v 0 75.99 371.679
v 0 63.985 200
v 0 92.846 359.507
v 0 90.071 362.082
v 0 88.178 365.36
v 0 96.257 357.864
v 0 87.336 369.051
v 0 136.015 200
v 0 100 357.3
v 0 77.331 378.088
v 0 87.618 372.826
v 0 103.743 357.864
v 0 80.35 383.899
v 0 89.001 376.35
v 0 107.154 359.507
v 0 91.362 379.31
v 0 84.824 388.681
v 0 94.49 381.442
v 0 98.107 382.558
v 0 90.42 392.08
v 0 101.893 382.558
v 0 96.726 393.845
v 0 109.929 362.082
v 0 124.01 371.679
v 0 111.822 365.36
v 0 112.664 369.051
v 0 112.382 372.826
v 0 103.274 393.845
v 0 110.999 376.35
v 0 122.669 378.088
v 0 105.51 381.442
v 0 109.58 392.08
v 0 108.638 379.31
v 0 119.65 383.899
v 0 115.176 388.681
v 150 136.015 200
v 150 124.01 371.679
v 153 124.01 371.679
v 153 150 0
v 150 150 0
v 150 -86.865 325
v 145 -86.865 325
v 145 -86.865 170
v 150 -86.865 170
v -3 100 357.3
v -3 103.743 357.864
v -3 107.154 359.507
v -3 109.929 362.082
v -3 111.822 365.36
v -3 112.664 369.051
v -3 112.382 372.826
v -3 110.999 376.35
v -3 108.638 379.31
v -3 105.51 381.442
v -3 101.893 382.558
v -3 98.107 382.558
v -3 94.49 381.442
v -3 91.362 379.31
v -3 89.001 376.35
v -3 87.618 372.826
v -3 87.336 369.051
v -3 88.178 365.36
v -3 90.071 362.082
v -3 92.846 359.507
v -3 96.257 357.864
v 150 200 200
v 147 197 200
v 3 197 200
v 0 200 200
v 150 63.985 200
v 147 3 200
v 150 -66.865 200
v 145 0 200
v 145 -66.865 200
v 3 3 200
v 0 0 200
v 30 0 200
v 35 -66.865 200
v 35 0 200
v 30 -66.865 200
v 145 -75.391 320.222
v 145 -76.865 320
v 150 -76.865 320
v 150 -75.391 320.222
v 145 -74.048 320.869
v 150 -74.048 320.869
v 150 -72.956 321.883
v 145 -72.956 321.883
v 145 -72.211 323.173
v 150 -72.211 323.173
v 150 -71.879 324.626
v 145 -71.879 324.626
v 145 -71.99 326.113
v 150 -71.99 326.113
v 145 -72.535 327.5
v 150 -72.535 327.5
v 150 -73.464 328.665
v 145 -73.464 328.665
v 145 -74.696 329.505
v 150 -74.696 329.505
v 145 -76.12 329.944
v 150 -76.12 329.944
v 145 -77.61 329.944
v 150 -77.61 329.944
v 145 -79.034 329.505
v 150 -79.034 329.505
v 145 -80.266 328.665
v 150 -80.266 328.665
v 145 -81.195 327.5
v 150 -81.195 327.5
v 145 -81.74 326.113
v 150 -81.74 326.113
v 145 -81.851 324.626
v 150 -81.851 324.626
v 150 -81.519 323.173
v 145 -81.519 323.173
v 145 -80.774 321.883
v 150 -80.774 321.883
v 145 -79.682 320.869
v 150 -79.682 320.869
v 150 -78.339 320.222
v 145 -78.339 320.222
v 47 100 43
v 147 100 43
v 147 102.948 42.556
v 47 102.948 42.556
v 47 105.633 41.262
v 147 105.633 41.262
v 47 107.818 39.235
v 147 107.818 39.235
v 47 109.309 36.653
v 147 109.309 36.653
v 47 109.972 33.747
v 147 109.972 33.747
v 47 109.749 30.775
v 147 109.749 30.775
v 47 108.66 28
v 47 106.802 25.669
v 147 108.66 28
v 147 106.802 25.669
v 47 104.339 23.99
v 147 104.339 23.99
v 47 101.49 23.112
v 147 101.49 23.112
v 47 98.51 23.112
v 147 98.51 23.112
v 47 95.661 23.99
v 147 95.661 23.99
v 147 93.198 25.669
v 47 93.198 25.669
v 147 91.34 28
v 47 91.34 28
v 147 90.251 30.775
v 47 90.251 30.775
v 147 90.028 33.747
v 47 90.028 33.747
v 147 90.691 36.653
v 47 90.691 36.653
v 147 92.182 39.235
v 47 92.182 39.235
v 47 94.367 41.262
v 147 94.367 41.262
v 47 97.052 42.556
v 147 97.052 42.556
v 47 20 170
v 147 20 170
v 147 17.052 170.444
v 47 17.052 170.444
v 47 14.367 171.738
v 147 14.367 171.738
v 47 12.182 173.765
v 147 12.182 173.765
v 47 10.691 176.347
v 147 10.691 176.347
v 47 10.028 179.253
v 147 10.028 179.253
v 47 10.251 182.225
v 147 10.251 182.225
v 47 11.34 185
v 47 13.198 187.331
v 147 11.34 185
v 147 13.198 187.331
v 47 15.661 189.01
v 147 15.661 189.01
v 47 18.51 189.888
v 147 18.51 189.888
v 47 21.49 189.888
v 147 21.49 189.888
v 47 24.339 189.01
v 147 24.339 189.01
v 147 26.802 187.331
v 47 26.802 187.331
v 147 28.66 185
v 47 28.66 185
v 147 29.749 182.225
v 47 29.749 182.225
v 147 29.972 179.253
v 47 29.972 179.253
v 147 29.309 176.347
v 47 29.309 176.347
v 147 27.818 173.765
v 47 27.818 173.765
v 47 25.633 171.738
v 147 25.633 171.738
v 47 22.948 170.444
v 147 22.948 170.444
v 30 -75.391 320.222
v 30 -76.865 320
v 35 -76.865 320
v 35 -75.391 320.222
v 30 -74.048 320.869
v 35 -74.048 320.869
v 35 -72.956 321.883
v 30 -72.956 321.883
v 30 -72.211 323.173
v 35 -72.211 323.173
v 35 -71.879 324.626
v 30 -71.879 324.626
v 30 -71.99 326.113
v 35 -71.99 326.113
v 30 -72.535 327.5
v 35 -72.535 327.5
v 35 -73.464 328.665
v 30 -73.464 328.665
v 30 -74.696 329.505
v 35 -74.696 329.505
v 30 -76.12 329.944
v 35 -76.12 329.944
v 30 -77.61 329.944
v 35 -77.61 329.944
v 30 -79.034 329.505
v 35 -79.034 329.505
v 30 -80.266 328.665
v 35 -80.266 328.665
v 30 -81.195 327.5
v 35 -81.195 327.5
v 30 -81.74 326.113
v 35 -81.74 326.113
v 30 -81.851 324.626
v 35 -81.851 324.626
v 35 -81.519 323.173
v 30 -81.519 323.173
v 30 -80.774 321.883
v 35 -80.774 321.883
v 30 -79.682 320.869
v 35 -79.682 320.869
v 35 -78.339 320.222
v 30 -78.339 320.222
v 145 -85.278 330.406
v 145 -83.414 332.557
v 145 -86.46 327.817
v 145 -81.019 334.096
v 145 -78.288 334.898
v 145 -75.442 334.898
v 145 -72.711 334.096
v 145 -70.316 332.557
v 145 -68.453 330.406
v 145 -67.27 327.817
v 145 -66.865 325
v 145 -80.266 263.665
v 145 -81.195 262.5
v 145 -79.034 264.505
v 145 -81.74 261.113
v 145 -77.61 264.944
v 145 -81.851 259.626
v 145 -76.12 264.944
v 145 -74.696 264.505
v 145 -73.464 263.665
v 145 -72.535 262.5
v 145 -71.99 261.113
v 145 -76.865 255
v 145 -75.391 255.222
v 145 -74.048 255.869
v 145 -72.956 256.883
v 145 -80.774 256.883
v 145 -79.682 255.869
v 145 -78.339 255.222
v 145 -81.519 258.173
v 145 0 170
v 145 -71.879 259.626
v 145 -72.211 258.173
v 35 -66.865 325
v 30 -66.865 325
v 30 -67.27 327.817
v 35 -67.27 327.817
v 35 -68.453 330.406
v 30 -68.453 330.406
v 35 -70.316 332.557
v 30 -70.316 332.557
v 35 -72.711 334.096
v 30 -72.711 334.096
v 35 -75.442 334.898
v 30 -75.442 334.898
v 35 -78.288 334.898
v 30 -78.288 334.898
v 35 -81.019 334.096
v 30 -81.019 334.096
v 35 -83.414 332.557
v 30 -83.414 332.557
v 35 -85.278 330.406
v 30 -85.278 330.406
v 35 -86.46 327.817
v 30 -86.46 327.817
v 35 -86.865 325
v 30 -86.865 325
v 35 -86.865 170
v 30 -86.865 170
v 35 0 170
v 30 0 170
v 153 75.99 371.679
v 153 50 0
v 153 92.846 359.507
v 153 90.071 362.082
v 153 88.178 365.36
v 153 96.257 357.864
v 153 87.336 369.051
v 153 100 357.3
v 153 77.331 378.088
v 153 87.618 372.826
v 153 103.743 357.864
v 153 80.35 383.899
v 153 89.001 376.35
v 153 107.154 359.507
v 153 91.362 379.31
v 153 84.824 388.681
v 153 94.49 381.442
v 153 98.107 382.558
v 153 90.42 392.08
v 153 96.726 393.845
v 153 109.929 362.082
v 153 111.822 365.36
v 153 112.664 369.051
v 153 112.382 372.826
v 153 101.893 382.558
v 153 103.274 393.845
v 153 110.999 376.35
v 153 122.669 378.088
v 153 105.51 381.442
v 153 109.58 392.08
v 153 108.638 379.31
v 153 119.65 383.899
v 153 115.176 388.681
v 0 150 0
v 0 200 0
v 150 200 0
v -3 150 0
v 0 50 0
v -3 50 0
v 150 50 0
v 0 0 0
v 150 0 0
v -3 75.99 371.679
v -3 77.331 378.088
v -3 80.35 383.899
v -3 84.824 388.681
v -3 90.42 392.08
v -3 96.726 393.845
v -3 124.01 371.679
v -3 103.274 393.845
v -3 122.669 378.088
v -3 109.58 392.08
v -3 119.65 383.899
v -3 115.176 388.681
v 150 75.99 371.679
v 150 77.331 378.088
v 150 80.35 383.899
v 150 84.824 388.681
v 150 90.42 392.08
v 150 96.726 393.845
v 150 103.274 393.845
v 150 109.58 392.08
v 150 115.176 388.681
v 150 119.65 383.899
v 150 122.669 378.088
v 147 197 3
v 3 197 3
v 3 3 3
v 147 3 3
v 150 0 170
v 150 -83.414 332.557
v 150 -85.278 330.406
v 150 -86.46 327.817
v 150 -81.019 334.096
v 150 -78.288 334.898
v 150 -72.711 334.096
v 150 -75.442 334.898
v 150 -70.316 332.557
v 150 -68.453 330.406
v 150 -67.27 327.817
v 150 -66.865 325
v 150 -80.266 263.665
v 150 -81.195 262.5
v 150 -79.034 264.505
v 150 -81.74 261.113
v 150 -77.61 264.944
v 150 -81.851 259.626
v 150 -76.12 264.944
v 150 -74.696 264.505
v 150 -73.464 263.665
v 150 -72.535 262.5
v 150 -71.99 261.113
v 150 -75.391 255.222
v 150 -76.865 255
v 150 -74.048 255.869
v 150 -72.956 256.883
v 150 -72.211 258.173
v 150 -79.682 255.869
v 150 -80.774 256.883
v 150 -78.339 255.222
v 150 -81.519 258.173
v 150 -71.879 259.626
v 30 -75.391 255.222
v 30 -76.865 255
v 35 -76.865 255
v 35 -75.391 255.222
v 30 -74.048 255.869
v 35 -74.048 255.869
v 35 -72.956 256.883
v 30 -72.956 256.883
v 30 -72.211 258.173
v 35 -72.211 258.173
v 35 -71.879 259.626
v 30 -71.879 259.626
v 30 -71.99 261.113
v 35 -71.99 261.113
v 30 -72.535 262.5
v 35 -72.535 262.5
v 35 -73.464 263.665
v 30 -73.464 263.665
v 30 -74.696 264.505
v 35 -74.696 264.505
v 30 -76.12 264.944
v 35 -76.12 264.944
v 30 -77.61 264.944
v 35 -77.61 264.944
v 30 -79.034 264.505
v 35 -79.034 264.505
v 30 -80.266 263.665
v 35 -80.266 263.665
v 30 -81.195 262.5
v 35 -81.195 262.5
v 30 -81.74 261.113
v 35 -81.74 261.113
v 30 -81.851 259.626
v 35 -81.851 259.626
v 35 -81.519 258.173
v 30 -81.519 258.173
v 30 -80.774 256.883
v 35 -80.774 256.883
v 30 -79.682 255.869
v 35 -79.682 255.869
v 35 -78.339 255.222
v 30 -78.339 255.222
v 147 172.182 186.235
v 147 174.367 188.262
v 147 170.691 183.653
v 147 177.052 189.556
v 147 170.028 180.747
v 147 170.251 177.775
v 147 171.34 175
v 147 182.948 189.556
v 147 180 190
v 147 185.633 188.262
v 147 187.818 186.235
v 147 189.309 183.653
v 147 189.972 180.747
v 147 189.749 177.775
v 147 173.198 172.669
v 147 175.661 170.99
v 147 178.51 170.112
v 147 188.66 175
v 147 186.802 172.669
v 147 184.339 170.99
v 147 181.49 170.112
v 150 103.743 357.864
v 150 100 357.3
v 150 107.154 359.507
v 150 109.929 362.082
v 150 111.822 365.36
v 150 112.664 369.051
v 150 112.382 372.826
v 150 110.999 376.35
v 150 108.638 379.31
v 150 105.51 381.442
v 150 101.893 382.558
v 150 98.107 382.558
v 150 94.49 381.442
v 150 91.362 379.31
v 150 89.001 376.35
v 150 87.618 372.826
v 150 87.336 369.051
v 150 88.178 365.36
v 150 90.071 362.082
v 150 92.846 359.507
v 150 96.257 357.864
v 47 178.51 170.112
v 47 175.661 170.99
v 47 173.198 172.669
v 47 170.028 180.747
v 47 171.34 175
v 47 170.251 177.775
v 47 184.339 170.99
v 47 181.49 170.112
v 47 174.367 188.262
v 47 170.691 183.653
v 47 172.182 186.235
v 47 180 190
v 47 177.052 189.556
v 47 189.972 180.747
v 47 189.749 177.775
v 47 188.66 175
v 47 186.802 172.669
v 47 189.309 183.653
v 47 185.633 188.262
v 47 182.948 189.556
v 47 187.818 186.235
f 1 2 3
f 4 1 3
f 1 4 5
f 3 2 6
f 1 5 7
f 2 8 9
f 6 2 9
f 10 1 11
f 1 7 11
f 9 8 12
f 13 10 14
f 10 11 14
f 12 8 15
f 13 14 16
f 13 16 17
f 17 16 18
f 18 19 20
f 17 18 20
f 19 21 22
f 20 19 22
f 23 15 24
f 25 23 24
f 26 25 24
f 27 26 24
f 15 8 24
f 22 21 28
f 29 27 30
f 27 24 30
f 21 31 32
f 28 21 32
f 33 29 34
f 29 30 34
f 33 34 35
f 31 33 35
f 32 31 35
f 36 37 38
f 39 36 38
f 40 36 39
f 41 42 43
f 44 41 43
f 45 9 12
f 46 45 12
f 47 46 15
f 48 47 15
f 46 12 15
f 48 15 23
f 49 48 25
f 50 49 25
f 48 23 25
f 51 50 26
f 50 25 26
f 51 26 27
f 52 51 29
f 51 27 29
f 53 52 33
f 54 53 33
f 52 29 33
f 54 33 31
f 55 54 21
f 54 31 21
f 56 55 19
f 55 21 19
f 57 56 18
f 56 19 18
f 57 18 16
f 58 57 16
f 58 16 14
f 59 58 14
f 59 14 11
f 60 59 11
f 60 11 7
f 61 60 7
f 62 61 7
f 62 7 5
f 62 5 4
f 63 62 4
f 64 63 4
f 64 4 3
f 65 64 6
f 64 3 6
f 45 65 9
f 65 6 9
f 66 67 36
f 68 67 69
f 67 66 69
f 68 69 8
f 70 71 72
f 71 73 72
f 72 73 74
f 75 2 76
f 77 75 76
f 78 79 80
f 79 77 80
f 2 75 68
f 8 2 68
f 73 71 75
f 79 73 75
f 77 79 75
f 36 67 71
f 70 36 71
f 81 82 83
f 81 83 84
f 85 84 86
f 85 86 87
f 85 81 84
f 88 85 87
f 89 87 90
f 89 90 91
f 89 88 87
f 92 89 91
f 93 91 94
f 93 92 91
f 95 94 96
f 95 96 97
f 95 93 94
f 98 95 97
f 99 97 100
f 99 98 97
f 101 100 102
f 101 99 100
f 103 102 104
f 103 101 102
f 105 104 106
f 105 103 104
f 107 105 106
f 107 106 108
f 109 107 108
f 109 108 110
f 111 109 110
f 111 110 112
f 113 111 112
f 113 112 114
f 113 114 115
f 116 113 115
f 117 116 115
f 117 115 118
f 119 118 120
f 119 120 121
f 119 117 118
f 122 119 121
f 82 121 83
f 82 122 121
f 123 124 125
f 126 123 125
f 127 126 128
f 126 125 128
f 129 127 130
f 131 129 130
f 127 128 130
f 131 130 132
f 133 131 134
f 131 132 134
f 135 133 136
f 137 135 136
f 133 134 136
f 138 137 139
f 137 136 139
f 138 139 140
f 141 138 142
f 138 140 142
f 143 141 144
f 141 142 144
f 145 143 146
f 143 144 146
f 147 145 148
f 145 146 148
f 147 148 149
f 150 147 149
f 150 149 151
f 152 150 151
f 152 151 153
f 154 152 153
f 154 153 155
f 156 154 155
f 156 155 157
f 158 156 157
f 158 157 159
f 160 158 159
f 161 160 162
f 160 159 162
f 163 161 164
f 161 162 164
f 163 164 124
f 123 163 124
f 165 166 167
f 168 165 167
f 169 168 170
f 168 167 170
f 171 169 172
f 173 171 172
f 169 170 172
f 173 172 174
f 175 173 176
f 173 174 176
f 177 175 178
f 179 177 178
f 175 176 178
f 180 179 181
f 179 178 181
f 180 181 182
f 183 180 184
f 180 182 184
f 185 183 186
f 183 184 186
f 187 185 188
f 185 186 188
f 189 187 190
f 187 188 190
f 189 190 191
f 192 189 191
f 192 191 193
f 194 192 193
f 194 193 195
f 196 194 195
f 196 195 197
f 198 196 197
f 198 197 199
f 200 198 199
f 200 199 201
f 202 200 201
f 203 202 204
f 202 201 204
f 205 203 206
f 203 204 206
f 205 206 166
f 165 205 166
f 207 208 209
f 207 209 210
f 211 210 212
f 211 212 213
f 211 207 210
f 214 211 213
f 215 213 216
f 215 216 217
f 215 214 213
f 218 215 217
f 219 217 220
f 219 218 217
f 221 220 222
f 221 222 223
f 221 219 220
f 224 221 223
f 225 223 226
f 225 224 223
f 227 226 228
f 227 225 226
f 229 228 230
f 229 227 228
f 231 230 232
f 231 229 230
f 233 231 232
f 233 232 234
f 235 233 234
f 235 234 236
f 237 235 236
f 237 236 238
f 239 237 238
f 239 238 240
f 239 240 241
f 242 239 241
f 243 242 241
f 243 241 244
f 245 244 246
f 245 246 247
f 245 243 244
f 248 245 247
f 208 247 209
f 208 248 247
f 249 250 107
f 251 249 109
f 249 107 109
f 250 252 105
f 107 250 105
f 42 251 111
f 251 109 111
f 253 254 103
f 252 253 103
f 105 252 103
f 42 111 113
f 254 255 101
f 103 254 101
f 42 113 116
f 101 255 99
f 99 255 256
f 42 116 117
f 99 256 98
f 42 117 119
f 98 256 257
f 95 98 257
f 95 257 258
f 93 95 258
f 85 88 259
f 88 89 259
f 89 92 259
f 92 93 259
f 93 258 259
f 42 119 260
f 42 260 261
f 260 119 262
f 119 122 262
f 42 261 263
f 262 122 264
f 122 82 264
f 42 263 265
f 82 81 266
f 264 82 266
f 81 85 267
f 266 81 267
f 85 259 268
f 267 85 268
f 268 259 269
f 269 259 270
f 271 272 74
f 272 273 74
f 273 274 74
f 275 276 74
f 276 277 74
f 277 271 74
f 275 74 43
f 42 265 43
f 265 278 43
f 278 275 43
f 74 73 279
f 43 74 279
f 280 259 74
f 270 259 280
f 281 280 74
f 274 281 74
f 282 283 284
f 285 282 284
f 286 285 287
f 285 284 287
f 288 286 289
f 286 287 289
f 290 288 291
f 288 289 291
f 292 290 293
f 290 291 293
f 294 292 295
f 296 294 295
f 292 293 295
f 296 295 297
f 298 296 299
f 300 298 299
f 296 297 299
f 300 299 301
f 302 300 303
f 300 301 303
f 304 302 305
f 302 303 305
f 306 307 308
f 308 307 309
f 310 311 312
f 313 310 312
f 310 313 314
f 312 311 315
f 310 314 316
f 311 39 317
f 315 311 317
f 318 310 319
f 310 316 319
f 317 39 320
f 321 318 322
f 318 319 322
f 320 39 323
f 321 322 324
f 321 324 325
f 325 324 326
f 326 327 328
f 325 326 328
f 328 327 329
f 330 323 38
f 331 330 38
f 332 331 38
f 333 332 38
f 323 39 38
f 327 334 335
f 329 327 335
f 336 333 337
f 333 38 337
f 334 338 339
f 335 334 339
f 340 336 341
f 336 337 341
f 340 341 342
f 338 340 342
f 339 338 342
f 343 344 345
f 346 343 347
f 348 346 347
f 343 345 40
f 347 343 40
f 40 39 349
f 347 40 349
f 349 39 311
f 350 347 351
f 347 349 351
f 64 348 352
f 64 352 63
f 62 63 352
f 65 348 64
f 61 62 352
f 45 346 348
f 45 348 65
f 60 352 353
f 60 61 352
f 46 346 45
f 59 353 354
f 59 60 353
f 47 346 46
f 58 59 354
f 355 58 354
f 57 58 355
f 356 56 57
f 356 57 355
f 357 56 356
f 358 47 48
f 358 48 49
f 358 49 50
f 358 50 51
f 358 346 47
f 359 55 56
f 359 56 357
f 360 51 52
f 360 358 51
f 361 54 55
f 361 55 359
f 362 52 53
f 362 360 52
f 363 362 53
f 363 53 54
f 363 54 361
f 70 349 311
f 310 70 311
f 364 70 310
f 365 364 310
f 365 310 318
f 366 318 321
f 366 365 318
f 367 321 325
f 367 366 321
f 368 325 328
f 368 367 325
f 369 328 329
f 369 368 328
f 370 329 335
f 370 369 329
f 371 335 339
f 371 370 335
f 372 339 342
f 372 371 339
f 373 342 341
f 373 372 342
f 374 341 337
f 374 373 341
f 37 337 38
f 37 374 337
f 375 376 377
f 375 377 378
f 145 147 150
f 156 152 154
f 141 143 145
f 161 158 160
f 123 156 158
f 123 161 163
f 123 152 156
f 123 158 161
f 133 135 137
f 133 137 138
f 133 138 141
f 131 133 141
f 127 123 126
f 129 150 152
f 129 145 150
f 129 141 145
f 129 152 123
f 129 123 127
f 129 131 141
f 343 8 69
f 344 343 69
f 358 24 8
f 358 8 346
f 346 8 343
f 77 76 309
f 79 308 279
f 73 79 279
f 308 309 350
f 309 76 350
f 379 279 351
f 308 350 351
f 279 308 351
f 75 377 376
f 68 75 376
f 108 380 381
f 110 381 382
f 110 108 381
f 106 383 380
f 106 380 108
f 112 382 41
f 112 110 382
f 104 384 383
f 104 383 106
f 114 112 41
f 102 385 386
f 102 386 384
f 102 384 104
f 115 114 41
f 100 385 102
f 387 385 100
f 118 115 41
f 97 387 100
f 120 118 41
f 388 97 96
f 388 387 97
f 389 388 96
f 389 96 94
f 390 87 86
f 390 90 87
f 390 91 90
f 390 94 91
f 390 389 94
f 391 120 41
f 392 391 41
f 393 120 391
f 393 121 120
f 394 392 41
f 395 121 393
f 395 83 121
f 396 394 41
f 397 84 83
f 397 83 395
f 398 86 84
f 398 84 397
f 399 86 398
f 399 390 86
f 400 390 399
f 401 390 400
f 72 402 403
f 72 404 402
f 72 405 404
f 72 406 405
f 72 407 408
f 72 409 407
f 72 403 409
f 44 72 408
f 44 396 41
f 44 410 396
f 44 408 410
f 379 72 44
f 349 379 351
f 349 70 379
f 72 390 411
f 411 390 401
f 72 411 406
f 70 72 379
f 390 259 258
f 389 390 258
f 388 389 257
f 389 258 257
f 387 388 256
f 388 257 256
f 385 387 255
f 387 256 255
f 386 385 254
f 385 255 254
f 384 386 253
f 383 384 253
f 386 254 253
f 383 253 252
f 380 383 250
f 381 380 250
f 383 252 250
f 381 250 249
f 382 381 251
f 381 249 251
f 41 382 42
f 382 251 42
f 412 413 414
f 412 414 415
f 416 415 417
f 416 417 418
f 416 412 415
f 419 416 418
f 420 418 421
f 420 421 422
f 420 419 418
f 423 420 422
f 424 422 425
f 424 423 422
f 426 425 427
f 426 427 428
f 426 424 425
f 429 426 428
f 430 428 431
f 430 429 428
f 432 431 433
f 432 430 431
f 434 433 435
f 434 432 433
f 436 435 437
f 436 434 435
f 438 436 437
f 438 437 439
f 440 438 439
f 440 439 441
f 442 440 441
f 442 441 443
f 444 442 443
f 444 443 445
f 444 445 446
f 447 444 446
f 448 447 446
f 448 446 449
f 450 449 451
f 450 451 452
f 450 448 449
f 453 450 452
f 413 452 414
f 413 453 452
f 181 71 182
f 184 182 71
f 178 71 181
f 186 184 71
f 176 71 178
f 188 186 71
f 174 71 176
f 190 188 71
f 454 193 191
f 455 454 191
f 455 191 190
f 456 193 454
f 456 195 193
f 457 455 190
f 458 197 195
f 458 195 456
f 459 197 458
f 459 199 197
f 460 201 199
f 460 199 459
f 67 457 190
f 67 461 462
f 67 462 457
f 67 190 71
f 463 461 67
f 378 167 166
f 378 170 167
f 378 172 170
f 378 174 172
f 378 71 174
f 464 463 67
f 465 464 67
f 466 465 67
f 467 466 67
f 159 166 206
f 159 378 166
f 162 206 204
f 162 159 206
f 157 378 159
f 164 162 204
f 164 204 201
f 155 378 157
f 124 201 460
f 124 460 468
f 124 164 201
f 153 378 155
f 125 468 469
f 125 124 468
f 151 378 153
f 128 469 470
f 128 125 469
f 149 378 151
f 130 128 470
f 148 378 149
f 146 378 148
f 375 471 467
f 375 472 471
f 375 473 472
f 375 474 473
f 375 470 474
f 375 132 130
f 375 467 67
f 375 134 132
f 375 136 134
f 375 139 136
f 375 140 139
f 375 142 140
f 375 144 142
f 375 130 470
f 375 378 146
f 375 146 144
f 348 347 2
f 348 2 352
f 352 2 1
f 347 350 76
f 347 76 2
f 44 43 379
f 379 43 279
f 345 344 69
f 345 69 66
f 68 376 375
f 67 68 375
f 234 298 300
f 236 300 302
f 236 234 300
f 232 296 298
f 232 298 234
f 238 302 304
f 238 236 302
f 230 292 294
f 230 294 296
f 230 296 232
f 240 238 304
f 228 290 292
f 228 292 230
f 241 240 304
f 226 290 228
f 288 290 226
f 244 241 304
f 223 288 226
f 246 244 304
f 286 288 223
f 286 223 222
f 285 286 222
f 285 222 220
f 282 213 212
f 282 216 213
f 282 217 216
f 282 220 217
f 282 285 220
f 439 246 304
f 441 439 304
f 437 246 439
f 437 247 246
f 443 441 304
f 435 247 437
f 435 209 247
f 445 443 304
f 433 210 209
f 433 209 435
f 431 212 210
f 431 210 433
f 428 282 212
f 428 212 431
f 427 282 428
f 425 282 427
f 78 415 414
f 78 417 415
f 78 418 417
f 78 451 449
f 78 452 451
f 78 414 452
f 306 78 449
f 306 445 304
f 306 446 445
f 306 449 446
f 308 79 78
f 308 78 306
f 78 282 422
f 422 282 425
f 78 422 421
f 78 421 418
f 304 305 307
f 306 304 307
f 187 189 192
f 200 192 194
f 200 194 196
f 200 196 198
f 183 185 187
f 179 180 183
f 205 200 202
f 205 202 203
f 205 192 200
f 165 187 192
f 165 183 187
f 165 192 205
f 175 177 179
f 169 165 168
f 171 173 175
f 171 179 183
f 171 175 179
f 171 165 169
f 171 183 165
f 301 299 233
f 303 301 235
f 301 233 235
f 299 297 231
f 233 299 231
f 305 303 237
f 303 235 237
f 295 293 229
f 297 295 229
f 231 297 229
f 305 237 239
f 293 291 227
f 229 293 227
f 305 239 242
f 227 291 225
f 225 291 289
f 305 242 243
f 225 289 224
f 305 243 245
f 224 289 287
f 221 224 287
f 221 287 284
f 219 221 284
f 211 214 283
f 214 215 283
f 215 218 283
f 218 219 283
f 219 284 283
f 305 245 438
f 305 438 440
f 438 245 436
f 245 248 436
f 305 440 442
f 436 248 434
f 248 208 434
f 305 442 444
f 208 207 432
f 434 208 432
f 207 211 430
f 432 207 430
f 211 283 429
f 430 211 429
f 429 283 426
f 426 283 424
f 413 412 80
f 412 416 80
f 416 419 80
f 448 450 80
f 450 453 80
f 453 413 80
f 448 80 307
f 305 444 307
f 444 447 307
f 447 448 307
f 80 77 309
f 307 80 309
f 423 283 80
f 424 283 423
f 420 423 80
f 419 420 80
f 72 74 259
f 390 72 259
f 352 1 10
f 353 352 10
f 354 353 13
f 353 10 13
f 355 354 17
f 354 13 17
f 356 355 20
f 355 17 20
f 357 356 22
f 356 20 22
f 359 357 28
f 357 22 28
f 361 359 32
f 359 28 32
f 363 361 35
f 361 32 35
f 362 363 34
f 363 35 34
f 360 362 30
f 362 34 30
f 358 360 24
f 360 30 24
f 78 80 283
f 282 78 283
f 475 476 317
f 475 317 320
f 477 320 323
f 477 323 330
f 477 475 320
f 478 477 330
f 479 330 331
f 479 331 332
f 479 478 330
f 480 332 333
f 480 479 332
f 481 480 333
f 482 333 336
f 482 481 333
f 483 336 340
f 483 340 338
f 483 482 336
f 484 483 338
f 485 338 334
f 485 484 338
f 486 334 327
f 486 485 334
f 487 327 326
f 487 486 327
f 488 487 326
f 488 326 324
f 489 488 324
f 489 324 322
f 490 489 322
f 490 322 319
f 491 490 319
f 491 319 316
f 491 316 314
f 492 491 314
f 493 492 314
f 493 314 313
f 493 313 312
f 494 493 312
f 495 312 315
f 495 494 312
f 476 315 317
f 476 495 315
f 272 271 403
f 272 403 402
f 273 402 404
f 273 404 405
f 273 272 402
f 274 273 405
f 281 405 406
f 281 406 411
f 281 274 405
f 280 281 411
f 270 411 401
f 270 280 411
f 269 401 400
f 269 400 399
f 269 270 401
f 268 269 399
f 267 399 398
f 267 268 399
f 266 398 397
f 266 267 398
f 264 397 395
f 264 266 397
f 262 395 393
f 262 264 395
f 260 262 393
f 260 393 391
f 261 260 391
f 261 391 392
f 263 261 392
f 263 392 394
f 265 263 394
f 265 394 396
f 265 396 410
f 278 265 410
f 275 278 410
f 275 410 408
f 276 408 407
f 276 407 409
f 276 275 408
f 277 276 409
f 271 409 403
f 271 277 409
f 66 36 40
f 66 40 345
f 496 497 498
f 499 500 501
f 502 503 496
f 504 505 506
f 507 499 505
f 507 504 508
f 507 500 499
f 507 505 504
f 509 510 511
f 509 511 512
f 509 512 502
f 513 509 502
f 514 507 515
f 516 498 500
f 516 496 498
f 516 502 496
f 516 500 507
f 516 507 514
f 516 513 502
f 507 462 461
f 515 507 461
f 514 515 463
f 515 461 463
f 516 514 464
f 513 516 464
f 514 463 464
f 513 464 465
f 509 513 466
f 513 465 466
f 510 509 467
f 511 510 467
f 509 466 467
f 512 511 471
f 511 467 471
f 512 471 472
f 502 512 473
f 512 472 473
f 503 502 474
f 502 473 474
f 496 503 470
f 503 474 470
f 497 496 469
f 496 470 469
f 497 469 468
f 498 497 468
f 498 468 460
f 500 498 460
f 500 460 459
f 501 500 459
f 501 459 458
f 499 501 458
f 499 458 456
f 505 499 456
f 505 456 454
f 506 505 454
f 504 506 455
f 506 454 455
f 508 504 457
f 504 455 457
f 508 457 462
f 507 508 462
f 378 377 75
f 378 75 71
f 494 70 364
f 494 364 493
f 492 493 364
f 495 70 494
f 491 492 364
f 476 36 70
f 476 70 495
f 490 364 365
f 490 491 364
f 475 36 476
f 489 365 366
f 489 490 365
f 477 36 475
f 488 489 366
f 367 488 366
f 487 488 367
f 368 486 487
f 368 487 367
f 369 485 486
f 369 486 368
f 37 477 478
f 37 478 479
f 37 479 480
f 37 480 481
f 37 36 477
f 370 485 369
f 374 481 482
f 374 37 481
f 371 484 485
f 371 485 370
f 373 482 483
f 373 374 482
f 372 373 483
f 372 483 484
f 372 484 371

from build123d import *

# Parameters (mm, degrees)
CROQUIS1_W              = 150
CROQUIS1_H              = 200
SALIENTE_EXTRUIR1_DEPTH = 200
VACIADO1_T              = -3
CROQUIS2_R              = 10
SALIENTE_EXTRUIR2_DEPTH = 100
CROQUIS3_R              = 12.7
SALIENTE_EXTRUIR3_DEPTH = 3
CROQUIS6_R              = 5
SALIENTE_EXTRUIR4_DEPTH = 5
SALIENTE_EXTRUIR5_START = -5
CROQUIS8_R              = 5
SALIENTE_EXTRUIR5_DEPTH = 5


with BuildPart() as part:
    # Croquis1 → Saliente-Extruir1 (new body)
    with BuildSketch(Plane.XY):
        with Locations((75, 100)):
            Rectangle(CROQUIS1_W, CROQUIS1_H)
    extrude(amount=SALIENTE_EXTRUIR1_DEPTH)

    # Vaciado1
    vaciado1_openings = [part.faces().sort_by_distance(p)[0] for p in [
        (75, 100, 200),
    ]]
    offset(amount=VACIADO1_T, openings=vaciado1_openings, kind=Kind.INTERSECTION)

    # Croquis2 → Saliente-Extruir2 (add)
    with BuildSketch(Plane.ZY.offset(-147)):
        with Locations((33, 100)):
            Circle(CROQUIS2_R)
        with Locations((180, 180)):
            Circle(CROQUIS2_R)
        with Locations(Location((180, 20, 0), (0, 0, 180))):
            Circle(CROQUIS2_R)
    extrude(amount=SALIENTE_EXTRUIR2_DEPTH)

    # Croquis3 → Saliente-Extruir3 (add)
    with BuildSketch(Plane(origin=(150, 0, 0), x_dir=(0, 0, -1), z_dir=(1, 0, 0))):
        with BuildLine():
            Line((-371.678920241, 124.009678041), (0, 150))
            Line((0, 150), (0, 50))
            Line((0, 50), (-371.678920241, 75.990321959))
            ThreePointArc((-371.678920241, 75.990321959), (-394.068307228, 100), (-371.678920241, 124.009678041))
        make_face()
        with Locations((-370, 100)):
            Circle(CROQUIS3_R, mode=Mode.SUBTRACT)
    saliente_extruir3 = extrude(amount=SALIENTE_EXTRUIR3_DEPTH)

    # Simetría1: Saliente-Extruir3 across plane
    add(saliente_extruir3.mirror(Plane(origin=(75, 0, 0), x_dir=(0, 0, 1), z_dir=(1, 0, 0))))

    # Croquis6 → Saliente-Extruir4 (add)
    with BuildSketch(Plane(origin=(30, 0, 0), x_dir=(0, 0, -1), z_dir=(1, 0, 0))):
        with BuildLine():
            Line((-200, 0), (-200, -66.865061558))
            Line((-200, -66.865061558), (-325, -66.865061558))
            ThreePointArc((-325, -66.865061558), (-335, -76.865061558), (-325, -86.865061558))
            Line((-325, -86.865061558), (-170, -86.865061558))
            Line((-170, -86.865061558), (-170, 0))
            Line((-170, 0), (-200, 0))
        make_face()
        with Locations((-325, -76.865061558)):
            Circle(CROQUIS6_R, mode=Mode.SUBTRACT)
        with Locations((-260, -76.865061558)):
            Circle(CROQUIS6_R, mode=Mode.SUBTRACT)
    extrude(amount=SALIENTE_EXTRUIR4_DEPTH)

    # Croquis8 → Saliente-Extruir5 (add)
    with BuildSketch(Plane(origin=(150, 0, 0), x_dir=(0, 0, -1), z_dir=(1, 0, 0)).offset(SALIENTE_EXTRUIR5_START)):
        with BuildLine():
            Line((-200, -66.865061558), (-325, -66.865061558))
            ThreePointArc((-325, -66.865061558), (-335, -76.865061558), (-325, -86.865061558))
            Line((-325, -86.865061558), (-170, -86.865061558))
            Line((-170, -86.865061558), (-170, 0))
            Line((-170, 0), (-200, 0))
            Line((-200, 0), (-200, -66.865061558))
        make_face()
        with Locations((-260, -76.865061558)):
            Circle(CROQUIS8_R, mode=Mode.SUBTRACT)
        with Locations((-325, -76.865061558)):
            Circle(CROQUIS8_R, mode=Mode.SUBTRACT)
    extrude(amount=SALIENTE_EXTRUIR5_DEPTH)


solid = part.part
